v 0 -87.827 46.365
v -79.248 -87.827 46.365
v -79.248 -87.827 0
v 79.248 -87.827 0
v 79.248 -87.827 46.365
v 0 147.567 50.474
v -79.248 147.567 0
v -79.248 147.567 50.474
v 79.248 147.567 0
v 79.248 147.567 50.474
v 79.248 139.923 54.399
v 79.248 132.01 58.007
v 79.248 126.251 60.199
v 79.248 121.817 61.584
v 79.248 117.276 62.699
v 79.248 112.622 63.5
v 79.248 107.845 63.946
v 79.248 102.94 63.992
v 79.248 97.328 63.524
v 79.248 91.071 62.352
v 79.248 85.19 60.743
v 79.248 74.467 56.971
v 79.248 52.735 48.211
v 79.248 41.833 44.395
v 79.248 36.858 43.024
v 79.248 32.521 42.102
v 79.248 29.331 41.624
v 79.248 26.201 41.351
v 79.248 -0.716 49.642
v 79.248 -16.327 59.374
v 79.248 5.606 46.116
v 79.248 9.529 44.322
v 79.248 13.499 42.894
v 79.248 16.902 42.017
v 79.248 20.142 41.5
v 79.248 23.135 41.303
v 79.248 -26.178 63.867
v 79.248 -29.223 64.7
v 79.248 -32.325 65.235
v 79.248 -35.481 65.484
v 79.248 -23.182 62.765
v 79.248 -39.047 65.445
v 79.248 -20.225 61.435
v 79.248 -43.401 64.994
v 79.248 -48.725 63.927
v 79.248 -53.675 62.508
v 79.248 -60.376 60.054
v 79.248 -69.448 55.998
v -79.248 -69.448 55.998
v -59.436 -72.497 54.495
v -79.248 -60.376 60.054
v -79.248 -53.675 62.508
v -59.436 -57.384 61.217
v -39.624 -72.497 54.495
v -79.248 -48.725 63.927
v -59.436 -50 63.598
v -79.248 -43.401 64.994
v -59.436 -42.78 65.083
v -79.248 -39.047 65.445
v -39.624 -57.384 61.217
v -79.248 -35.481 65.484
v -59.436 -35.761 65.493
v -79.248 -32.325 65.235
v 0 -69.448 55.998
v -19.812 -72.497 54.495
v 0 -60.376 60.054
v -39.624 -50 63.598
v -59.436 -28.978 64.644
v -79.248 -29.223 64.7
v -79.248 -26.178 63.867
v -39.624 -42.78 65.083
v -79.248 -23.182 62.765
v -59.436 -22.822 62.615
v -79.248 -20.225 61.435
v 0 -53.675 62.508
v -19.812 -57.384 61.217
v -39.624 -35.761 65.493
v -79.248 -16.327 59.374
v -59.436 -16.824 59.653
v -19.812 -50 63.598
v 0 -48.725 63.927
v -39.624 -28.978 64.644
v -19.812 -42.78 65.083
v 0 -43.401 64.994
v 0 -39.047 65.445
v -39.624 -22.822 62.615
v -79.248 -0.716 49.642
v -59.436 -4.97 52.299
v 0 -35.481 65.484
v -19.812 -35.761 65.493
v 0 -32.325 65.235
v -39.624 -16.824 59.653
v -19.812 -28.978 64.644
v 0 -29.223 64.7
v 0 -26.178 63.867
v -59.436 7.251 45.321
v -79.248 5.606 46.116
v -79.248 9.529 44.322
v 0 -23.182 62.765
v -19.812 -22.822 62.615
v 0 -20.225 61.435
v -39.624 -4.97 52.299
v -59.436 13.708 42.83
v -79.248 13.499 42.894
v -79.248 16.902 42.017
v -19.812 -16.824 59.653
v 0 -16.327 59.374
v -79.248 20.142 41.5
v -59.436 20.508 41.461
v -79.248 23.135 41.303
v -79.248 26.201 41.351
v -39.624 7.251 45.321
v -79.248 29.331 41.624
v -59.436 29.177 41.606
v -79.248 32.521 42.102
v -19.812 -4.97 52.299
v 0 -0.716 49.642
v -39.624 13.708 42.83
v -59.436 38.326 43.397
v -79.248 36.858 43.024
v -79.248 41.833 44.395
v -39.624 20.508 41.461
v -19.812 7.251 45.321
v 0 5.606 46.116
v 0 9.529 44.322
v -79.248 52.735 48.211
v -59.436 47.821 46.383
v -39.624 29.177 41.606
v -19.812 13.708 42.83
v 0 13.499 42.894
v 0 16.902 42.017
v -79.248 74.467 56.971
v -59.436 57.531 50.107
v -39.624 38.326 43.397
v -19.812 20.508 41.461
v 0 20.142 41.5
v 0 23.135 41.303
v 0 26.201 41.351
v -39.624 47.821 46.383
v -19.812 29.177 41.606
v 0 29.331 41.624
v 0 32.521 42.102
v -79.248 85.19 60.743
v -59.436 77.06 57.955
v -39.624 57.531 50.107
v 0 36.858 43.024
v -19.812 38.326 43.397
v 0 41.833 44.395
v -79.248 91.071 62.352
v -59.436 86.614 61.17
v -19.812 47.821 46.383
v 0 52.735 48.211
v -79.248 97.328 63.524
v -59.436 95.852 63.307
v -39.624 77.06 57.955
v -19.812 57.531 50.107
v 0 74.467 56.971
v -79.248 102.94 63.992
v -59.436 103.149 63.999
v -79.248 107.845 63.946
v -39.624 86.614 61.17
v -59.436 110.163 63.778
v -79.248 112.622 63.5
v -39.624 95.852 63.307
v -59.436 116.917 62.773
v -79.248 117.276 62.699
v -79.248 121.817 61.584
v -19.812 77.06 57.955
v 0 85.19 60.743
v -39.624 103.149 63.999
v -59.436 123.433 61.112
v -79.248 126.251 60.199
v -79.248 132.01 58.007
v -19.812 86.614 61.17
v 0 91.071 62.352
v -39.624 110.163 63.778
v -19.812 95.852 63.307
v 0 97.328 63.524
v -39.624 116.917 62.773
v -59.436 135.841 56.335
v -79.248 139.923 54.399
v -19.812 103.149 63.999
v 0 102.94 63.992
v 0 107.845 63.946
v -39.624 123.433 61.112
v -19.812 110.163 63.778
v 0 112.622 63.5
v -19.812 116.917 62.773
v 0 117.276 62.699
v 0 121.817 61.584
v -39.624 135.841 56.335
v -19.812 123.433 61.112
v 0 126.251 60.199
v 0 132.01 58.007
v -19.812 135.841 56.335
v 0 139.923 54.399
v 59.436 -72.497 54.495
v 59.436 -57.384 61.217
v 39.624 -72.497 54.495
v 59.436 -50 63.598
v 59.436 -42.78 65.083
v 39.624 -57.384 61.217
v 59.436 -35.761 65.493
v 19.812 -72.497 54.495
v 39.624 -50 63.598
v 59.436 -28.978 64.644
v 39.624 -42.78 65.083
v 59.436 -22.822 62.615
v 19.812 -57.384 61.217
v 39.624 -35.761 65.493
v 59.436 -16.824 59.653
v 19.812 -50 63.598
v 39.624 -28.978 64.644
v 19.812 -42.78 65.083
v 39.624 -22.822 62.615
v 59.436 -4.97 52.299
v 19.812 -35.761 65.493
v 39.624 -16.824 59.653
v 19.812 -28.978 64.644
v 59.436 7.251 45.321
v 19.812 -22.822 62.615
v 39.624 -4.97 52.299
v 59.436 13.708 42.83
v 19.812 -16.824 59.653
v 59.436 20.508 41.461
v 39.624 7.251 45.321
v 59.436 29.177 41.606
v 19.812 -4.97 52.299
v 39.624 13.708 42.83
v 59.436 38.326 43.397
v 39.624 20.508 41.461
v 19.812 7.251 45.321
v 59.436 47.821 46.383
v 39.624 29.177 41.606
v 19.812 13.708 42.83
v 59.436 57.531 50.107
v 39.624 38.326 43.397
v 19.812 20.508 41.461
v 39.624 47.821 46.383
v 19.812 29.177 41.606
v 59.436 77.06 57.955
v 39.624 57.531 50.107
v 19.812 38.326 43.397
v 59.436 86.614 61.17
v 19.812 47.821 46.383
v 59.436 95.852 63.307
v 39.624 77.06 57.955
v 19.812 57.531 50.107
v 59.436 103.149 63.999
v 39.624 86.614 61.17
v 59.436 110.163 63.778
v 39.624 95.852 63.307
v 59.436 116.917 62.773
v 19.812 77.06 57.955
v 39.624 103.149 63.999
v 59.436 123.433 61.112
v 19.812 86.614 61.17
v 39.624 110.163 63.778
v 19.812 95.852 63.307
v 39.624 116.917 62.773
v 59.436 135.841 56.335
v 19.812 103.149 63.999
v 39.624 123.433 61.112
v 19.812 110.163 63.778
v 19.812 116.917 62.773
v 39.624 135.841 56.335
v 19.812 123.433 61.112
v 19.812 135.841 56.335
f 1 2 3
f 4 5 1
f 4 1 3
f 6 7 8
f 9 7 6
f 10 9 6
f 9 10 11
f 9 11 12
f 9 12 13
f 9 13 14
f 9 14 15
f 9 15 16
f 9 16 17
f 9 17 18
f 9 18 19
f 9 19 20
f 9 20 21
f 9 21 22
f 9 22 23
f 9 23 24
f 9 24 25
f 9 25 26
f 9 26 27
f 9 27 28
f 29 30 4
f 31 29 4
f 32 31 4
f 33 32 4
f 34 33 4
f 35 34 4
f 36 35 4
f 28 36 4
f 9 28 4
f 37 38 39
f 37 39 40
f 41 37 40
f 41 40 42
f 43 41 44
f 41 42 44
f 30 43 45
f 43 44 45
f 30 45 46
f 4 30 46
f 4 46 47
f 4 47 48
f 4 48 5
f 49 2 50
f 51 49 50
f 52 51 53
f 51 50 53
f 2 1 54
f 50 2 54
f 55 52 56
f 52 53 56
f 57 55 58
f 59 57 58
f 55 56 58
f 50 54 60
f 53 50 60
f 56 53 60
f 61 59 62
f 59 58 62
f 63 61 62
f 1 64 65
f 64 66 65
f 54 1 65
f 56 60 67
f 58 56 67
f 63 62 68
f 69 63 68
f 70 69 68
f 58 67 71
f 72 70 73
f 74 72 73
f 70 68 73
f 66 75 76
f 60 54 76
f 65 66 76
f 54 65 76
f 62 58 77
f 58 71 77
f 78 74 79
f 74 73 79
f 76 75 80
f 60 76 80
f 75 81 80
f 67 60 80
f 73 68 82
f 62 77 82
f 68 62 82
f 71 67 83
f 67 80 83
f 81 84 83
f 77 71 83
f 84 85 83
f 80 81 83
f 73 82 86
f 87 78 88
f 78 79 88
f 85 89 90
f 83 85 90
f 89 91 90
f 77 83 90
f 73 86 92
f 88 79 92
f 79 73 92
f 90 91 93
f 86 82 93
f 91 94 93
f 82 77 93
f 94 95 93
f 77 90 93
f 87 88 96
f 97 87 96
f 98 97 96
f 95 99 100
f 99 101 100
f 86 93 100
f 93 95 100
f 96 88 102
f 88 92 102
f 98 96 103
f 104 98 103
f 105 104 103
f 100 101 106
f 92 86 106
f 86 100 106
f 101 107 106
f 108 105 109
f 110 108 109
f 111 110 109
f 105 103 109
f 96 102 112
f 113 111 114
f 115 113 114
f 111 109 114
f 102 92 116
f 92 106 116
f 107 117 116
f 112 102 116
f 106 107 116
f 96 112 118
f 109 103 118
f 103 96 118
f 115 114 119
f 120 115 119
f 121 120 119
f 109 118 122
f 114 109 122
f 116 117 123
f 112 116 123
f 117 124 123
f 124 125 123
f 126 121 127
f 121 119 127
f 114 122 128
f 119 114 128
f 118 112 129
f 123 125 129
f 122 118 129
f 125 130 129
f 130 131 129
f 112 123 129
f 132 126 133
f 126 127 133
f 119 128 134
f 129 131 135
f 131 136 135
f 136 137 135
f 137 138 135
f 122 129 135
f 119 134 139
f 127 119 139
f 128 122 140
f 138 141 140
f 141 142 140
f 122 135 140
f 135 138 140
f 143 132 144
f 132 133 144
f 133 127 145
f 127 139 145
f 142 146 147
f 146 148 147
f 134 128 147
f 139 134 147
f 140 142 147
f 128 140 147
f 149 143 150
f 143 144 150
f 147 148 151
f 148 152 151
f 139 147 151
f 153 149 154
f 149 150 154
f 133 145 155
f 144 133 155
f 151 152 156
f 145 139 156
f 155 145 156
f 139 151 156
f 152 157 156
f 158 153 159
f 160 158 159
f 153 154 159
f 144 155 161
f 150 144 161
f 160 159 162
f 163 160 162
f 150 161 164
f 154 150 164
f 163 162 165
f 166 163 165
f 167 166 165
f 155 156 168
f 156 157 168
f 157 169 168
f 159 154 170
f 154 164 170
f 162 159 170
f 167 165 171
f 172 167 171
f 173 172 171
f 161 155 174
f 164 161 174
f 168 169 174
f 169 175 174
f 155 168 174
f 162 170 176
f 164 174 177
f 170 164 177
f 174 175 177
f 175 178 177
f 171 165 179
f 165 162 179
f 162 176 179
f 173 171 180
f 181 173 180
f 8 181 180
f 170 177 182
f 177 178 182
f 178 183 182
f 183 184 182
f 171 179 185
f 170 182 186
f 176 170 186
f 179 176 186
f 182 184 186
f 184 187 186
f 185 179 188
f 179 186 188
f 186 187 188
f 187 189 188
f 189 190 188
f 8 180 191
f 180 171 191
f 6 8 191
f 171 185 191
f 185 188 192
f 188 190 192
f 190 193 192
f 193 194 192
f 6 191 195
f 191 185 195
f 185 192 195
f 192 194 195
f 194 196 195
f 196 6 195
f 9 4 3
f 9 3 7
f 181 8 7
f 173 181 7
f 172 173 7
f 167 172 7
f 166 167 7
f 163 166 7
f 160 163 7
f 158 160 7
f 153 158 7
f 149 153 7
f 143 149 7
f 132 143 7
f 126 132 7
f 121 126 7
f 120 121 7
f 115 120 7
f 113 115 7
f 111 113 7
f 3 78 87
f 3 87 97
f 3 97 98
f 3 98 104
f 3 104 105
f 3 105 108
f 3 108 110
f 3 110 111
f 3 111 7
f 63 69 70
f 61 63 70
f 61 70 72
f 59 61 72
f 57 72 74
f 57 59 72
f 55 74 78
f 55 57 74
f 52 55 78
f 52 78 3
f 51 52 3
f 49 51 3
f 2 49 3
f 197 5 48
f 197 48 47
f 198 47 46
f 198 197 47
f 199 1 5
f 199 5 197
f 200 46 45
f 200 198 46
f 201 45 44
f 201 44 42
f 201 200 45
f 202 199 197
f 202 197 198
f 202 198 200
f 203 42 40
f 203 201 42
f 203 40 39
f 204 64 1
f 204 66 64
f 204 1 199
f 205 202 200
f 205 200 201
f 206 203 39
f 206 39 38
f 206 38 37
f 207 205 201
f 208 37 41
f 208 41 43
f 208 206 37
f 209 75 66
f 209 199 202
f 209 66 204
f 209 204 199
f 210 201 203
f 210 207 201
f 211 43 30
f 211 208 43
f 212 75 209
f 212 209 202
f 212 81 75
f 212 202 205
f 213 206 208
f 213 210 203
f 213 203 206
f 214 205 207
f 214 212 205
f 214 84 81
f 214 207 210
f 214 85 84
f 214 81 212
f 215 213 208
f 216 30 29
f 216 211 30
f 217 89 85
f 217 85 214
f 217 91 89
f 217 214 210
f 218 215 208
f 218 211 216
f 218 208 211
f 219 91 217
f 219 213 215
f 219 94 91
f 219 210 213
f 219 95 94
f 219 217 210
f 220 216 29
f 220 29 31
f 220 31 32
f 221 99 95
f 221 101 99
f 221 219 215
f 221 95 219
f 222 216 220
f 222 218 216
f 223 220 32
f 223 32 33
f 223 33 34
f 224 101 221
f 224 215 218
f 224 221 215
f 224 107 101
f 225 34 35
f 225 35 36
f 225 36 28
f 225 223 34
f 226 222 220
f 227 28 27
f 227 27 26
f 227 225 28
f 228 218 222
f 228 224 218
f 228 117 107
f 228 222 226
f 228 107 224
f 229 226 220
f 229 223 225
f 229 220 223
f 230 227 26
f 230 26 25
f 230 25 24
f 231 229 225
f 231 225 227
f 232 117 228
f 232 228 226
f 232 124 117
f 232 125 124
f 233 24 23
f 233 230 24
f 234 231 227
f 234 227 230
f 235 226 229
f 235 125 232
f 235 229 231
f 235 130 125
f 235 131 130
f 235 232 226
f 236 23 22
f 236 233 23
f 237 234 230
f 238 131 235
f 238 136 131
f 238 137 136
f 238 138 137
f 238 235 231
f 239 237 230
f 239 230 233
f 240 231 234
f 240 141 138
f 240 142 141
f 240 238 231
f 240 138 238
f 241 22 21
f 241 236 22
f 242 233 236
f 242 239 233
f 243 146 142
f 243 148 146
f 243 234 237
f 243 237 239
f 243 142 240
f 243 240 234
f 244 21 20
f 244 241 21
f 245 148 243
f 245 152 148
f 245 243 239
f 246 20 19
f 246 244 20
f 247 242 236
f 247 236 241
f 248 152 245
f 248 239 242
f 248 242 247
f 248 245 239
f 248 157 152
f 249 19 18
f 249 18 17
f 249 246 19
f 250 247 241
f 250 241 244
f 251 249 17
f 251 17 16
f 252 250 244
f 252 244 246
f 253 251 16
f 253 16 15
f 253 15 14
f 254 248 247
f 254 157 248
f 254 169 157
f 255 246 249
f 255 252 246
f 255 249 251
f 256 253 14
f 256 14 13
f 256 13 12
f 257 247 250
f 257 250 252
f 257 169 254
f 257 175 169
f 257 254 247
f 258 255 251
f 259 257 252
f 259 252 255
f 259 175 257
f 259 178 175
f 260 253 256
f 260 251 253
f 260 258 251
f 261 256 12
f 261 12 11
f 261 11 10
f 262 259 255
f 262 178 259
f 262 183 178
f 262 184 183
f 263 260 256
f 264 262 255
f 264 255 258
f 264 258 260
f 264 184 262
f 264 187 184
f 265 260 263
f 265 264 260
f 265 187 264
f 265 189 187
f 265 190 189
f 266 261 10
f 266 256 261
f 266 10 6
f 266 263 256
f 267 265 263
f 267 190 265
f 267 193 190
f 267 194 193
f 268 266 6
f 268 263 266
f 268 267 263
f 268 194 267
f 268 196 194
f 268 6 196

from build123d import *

# Parameters (mm, degrees)
F1_DEPTH      = 79.248
F1_DEPTH_BACK = 79.248


with BuildPart() as f1:
    # F0 (on Right) → F1 (new body, two sides)
    with BuildSketch(Plane.YZ) as f1_sk:
        with BuildLine():
            add(Edge.make_bspline(
                [(-87.8269448876, 46.3654994965), (-67.3718330678, 57.497701411), (-27.2656839592, 79.3356256267), (18.7585197488, 22.3790043158), (95.5671107391, 76.1054529444), (132.3078811353, 58.5542912131), (147.5671231747, 50.474466549)],
                knots=[0, 0, 0, 0, 0.2500072518, 0.4854414047, 0.7675219262, 1, 1, 1, 1], degree=3))
            Line((-87.8269448876, 46.3654994965), (-87.8269448876, 0))
            Line((-87.8269448876, 0), (147.5671231747, 0))
            Line((147.5671231747, 0), (147.5671231747, 50.474466549))
        make_face()
    extrude(amount=F1_DEPTH)
    extrude(f1_sk.sketch, amount=-F1_DEPTH_BACK)


solid = f1.part
